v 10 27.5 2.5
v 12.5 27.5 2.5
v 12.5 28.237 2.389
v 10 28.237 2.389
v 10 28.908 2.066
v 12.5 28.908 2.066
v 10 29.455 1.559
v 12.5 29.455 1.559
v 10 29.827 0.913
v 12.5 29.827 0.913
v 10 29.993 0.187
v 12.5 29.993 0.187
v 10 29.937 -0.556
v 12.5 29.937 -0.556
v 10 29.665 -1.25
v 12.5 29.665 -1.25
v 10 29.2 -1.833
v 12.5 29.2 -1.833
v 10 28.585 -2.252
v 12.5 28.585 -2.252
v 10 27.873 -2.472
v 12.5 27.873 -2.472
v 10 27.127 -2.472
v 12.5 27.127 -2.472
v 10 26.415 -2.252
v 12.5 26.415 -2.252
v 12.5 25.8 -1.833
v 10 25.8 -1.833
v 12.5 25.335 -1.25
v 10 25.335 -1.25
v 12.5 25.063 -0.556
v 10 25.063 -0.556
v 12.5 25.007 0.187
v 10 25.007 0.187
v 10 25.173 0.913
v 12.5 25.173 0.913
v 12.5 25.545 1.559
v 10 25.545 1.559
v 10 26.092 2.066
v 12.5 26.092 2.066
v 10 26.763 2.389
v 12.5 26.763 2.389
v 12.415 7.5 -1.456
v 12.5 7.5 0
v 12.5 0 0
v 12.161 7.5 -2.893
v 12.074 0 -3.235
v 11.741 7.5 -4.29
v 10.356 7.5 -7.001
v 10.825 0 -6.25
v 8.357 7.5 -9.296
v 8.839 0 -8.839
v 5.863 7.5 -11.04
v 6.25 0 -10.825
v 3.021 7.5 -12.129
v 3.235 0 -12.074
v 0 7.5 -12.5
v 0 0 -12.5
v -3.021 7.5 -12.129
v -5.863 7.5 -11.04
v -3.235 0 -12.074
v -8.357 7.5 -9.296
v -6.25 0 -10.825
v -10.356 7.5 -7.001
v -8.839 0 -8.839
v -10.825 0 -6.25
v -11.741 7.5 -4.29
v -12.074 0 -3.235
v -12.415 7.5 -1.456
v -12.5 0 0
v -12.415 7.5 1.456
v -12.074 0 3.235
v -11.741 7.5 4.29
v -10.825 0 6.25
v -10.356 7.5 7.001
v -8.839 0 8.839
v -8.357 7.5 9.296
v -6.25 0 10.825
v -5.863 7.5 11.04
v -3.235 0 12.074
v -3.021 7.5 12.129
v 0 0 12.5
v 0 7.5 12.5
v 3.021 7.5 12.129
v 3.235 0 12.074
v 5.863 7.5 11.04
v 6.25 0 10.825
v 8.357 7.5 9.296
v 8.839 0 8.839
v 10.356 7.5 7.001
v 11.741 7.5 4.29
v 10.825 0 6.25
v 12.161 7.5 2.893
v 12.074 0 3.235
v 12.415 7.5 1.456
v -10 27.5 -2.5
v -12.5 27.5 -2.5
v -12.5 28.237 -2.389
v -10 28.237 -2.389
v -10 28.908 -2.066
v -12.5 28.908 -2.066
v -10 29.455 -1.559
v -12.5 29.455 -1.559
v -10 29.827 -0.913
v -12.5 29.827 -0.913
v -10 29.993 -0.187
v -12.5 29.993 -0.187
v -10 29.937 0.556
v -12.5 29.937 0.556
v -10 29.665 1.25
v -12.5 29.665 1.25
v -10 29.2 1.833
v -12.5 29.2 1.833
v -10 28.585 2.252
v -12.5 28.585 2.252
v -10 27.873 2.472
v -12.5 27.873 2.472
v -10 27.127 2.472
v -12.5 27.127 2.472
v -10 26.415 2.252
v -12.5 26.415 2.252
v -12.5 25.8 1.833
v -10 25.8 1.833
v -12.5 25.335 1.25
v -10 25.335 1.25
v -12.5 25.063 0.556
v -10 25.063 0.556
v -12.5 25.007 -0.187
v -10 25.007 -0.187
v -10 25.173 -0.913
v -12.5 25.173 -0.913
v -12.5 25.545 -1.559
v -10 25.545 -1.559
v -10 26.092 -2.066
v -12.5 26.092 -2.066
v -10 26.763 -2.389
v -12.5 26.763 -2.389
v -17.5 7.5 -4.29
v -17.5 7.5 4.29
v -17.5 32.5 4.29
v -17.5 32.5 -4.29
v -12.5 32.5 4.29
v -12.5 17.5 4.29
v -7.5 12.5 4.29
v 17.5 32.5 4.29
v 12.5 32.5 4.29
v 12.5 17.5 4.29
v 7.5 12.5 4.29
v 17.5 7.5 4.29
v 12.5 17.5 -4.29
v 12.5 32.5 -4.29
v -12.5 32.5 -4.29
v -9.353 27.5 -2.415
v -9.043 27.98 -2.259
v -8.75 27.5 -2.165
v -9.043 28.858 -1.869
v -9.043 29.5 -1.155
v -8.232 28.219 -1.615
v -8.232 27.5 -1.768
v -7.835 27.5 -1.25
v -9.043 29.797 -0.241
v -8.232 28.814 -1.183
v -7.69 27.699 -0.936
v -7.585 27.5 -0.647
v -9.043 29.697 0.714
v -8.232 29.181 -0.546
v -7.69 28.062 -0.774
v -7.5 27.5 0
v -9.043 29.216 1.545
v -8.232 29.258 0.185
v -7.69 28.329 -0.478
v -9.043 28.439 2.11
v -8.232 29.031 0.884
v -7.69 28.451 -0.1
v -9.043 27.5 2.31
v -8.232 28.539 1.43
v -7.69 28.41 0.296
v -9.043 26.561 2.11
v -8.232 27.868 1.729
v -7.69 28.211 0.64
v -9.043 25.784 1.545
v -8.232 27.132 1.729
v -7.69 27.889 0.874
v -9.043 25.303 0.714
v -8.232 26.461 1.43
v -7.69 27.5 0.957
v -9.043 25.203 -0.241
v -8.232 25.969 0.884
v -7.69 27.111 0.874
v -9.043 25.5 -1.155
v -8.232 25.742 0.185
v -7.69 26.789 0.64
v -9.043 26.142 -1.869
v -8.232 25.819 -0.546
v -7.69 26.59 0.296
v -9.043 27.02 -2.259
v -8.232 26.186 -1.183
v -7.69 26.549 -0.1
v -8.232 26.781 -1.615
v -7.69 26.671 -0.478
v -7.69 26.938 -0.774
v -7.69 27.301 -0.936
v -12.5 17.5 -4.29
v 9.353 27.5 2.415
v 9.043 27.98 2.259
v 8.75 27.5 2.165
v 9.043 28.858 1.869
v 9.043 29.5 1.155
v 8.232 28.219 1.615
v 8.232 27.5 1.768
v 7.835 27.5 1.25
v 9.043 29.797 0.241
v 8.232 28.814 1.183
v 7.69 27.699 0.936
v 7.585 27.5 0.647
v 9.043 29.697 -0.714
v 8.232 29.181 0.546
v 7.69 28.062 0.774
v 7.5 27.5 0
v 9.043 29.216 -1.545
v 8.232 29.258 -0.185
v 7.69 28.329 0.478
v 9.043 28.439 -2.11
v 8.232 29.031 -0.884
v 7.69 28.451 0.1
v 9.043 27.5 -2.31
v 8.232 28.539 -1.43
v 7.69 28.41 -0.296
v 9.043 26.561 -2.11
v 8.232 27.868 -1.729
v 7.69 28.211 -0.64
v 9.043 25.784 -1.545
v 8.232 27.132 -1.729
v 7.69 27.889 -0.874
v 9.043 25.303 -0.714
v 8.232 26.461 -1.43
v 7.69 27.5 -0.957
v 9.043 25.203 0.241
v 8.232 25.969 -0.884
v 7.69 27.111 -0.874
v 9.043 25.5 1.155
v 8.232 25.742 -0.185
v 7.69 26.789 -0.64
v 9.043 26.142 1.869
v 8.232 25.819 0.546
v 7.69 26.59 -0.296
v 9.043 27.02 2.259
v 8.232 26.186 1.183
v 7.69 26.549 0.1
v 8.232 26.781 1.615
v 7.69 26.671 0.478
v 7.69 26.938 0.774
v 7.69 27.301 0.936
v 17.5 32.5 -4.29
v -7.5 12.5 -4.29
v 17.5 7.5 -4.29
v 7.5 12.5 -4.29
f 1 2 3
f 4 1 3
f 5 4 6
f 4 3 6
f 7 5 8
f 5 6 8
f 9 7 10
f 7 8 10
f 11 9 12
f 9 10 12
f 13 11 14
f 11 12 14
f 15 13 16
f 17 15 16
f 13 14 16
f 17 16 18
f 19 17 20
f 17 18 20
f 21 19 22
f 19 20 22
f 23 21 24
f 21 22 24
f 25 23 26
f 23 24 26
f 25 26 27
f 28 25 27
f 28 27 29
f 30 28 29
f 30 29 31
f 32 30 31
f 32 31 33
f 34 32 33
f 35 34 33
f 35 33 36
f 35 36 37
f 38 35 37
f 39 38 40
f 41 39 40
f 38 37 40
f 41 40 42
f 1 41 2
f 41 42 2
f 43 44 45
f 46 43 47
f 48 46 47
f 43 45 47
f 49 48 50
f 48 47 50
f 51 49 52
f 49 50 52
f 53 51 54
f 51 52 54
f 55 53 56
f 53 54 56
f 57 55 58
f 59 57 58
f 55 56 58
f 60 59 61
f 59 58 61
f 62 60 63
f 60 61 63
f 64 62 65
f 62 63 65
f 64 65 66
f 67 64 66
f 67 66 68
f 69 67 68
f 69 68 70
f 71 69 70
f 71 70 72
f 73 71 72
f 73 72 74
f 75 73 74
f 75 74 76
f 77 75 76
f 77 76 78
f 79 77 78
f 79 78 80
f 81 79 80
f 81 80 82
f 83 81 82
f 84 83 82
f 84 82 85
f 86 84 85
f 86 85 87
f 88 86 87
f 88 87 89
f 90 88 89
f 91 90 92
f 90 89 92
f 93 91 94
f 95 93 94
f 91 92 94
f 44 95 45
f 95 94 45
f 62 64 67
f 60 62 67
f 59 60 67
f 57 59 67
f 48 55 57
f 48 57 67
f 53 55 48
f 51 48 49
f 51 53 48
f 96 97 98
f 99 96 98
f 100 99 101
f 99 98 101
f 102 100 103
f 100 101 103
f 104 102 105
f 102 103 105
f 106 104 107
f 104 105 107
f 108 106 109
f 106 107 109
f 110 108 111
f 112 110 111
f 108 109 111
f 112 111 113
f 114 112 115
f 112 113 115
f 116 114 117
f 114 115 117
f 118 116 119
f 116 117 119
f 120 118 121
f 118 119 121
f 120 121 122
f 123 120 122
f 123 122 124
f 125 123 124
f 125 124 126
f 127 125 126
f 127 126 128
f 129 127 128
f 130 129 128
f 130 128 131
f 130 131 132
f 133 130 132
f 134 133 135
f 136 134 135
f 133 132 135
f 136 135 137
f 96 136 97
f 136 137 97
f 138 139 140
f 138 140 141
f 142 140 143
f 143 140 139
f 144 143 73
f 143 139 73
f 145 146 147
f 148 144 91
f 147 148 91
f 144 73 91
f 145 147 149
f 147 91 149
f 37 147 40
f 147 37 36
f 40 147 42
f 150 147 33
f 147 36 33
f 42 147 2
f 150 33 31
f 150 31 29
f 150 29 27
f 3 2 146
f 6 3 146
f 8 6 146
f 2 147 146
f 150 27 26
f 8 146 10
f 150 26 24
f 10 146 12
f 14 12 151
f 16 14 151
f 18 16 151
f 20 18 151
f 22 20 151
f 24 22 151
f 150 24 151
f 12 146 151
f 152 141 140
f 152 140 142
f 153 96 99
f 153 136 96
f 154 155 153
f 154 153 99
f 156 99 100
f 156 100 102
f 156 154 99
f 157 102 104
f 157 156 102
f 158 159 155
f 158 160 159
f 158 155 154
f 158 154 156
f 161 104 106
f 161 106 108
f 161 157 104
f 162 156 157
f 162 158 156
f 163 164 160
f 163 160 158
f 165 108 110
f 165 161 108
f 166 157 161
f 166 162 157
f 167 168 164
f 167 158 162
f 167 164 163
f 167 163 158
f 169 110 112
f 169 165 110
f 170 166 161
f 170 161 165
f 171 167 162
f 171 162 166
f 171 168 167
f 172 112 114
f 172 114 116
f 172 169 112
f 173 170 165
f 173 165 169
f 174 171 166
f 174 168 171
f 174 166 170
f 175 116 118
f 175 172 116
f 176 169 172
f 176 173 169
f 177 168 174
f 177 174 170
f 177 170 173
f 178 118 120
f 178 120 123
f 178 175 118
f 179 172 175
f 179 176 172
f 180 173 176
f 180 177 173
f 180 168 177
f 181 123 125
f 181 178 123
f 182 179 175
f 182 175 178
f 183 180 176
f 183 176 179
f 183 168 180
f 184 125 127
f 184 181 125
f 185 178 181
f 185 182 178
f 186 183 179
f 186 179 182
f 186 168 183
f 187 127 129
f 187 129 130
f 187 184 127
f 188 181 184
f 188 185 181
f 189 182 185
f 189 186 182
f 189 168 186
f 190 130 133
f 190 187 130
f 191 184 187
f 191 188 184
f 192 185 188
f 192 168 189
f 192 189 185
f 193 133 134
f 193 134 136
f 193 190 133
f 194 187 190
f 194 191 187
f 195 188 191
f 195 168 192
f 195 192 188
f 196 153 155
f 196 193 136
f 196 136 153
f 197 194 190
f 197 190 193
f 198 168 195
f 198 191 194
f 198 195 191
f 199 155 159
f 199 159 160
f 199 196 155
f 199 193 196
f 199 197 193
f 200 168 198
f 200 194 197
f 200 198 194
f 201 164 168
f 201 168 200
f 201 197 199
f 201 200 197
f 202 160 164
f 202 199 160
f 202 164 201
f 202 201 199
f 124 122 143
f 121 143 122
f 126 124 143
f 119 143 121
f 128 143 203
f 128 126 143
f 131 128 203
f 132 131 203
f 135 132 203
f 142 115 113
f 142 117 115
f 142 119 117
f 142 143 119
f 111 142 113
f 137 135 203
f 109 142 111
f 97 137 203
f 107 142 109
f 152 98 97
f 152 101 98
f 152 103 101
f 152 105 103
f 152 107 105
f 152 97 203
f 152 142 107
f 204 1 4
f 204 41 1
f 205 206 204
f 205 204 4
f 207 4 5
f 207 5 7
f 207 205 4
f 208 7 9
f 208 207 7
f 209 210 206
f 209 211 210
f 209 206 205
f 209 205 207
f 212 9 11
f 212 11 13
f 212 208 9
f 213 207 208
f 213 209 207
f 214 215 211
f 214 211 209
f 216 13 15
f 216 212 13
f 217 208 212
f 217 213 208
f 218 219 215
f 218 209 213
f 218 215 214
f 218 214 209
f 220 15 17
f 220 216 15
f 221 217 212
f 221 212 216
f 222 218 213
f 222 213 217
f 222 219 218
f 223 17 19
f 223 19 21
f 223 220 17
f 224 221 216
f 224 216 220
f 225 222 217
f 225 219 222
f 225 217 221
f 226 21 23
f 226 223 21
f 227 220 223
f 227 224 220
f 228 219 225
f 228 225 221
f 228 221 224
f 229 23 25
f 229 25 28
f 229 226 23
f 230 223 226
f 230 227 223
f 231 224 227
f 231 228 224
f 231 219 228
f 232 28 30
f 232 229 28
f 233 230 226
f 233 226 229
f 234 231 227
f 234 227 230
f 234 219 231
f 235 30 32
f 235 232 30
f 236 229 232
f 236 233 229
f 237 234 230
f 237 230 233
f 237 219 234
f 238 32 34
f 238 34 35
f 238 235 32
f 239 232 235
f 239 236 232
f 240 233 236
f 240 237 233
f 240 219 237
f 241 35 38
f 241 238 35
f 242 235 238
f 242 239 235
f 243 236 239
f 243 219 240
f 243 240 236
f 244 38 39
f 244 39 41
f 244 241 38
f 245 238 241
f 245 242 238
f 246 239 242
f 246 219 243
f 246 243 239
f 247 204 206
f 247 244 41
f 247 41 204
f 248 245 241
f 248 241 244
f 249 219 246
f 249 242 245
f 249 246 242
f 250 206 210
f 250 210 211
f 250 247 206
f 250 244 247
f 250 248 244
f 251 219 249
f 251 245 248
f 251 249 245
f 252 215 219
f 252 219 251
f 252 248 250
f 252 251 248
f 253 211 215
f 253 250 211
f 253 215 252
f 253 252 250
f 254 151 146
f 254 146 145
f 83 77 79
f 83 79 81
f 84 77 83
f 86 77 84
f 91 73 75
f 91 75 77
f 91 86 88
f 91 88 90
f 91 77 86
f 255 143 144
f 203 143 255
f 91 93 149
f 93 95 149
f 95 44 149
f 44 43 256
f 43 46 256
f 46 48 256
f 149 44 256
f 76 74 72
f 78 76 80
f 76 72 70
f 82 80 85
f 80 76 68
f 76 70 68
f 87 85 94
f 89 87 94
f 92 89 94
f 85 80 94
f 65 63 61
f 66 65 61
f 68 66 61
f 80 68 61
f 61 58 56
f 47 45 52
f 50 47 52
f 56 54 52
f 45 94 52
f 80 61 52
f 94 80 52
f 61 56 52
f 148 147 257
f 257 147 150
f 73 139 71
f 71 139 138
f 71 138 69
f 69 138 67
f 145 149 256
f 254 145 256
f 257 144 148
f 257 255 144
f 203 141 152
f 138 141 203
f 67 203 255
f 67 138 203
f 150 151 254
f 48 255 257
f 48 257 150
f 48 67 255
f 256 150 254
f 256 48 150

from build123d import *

# Parameters (mm, degrees)
SKETCH1_R           = 12.5
BOSS_EXTRUDE1_DEPTH = 7.5
SKETCH2_W           = 35
SKETCH2_H           = 8.580767914
BOSS_EXTRUDE2_DEPTH = 25
SKETCH3_W           = 25
SKETCH3_H           = 8.580767914
CUT_EXTRUDE1_DEPTH  = 20
SKETCH4_R           = 2.5
BOSS_EXTRUDE3_DEPTH = 5
SKETCH5_R           = 2.5
BOSS_EXTRUDE4_DEPTH = 5
CHAMFER1_SIZE       = 5
CHAMFER2_SIZE       = 5
FILLET1_R           = 2.5
FILLET2_R           = 2.5


with BuildPart() as part:
    # Sketch1 → Boss-Extrude1 (new body)
    with BuildSketch(Plane(origin=(0, 0, 0), x_dir=(1, 0, 0), z_dir=(0, 1, 0))):
        Circle(SKETCH1_R)
    extrude(amount=BOSS_EXTRUDE1_DEPTH)

    # Sketch2 → Boss-Extrude2 (add)
    with BuildSketch(Plane(origin=(0, 7.5, 0), x_dir=(1, 0, 0), z_dir=(0, 1, 0))):
        Rectangle(SKETCH2_W, SKETCH2_H)
    extrude(amount=BOSS_EXTRUDE2_DEPTH)

    # Sketch3 → Cut-Extrude1 (cut)
    with BuildSketch(Plane(origin=(0, 32.5, 0), x_dir=(1, 0, 0), z_dir=(0, 1, 0))):
        Rectangle(SKETCH3_W, SKETCH3_H)
    extrude(amount=-CUT_EXTRUDE1_DEPTH, mode=Mode.SUBTRACT)

    # Sketch4 → Boss-Extrude3 (add)
    with BuildSketch(Plane(origin=(-12.5, 0, 0), x_dir=(0, 0, -1), z_dir=(1, 0, 0))):
        with Locations((0, 27.5)):
            Circle(SKETCH4_R)
    extrude(amount=BOSS_EXTRUDE3_DEPTH)

    # Sketch5 → Boss-Extrude4 (add)
    with BuildSketch(Plane.ZY.offset(-12.5)):
        with Locations((0, 27.5)):
            Circle(SKETCH5_R)
    extrude(amount=BOSS_EXTRUDE4_DEPTH)

    # Chamfer1
    chamfer1_edges = [part.edges().sort_by_distance(p)[0] for p in [
        (-12.5, 12.5, 0),
    ]]
    chamfer(chamfer1_edges, length=CHAMFER1_SIZE)

    # Chamfer2
    chamfer2_edges = [part.edges().sort_by_distance(p)[0] for p in [
        (12.5, 12.5, 0),
    ]]
    chamfer(chamfer2_edges, length=CHAMFER2_SIZE)

    # Fillet1
    fillet1_edges = [part.edges().sort_by_distance(p)[0] for p in [
        (-7.5, 27.5, 2.5),
    ]]
    fillet(fillet1_edges, radius=FILLET1_R)

    # Fillet2
    fillet2_edges = [part.edges().sort_by_distance(p)[0] for p in [
        (7.5, 27.5, -2.5),
    ]]
    fillet(fillet2_edges, radius=FILLET2_R)


solid = part.part
